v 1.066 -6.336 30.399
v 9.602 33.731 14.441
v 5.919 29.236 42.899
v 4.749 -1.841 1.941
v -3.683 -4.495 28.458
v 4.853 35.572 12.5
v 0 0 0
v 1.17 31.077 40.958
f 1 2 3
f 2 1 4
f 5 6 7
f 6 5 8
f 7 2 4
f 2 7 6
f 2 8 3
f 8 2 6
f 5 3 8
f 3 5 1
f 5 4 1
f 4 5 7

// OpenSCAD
// Generated by generate_scads.py
scale([1.0,1.5,2.0]) {
  rotate([120,90,45]) {
    rotate([15,60,120]) {
      cube(size=[25,15,5], center=false);
    }
  }
}
